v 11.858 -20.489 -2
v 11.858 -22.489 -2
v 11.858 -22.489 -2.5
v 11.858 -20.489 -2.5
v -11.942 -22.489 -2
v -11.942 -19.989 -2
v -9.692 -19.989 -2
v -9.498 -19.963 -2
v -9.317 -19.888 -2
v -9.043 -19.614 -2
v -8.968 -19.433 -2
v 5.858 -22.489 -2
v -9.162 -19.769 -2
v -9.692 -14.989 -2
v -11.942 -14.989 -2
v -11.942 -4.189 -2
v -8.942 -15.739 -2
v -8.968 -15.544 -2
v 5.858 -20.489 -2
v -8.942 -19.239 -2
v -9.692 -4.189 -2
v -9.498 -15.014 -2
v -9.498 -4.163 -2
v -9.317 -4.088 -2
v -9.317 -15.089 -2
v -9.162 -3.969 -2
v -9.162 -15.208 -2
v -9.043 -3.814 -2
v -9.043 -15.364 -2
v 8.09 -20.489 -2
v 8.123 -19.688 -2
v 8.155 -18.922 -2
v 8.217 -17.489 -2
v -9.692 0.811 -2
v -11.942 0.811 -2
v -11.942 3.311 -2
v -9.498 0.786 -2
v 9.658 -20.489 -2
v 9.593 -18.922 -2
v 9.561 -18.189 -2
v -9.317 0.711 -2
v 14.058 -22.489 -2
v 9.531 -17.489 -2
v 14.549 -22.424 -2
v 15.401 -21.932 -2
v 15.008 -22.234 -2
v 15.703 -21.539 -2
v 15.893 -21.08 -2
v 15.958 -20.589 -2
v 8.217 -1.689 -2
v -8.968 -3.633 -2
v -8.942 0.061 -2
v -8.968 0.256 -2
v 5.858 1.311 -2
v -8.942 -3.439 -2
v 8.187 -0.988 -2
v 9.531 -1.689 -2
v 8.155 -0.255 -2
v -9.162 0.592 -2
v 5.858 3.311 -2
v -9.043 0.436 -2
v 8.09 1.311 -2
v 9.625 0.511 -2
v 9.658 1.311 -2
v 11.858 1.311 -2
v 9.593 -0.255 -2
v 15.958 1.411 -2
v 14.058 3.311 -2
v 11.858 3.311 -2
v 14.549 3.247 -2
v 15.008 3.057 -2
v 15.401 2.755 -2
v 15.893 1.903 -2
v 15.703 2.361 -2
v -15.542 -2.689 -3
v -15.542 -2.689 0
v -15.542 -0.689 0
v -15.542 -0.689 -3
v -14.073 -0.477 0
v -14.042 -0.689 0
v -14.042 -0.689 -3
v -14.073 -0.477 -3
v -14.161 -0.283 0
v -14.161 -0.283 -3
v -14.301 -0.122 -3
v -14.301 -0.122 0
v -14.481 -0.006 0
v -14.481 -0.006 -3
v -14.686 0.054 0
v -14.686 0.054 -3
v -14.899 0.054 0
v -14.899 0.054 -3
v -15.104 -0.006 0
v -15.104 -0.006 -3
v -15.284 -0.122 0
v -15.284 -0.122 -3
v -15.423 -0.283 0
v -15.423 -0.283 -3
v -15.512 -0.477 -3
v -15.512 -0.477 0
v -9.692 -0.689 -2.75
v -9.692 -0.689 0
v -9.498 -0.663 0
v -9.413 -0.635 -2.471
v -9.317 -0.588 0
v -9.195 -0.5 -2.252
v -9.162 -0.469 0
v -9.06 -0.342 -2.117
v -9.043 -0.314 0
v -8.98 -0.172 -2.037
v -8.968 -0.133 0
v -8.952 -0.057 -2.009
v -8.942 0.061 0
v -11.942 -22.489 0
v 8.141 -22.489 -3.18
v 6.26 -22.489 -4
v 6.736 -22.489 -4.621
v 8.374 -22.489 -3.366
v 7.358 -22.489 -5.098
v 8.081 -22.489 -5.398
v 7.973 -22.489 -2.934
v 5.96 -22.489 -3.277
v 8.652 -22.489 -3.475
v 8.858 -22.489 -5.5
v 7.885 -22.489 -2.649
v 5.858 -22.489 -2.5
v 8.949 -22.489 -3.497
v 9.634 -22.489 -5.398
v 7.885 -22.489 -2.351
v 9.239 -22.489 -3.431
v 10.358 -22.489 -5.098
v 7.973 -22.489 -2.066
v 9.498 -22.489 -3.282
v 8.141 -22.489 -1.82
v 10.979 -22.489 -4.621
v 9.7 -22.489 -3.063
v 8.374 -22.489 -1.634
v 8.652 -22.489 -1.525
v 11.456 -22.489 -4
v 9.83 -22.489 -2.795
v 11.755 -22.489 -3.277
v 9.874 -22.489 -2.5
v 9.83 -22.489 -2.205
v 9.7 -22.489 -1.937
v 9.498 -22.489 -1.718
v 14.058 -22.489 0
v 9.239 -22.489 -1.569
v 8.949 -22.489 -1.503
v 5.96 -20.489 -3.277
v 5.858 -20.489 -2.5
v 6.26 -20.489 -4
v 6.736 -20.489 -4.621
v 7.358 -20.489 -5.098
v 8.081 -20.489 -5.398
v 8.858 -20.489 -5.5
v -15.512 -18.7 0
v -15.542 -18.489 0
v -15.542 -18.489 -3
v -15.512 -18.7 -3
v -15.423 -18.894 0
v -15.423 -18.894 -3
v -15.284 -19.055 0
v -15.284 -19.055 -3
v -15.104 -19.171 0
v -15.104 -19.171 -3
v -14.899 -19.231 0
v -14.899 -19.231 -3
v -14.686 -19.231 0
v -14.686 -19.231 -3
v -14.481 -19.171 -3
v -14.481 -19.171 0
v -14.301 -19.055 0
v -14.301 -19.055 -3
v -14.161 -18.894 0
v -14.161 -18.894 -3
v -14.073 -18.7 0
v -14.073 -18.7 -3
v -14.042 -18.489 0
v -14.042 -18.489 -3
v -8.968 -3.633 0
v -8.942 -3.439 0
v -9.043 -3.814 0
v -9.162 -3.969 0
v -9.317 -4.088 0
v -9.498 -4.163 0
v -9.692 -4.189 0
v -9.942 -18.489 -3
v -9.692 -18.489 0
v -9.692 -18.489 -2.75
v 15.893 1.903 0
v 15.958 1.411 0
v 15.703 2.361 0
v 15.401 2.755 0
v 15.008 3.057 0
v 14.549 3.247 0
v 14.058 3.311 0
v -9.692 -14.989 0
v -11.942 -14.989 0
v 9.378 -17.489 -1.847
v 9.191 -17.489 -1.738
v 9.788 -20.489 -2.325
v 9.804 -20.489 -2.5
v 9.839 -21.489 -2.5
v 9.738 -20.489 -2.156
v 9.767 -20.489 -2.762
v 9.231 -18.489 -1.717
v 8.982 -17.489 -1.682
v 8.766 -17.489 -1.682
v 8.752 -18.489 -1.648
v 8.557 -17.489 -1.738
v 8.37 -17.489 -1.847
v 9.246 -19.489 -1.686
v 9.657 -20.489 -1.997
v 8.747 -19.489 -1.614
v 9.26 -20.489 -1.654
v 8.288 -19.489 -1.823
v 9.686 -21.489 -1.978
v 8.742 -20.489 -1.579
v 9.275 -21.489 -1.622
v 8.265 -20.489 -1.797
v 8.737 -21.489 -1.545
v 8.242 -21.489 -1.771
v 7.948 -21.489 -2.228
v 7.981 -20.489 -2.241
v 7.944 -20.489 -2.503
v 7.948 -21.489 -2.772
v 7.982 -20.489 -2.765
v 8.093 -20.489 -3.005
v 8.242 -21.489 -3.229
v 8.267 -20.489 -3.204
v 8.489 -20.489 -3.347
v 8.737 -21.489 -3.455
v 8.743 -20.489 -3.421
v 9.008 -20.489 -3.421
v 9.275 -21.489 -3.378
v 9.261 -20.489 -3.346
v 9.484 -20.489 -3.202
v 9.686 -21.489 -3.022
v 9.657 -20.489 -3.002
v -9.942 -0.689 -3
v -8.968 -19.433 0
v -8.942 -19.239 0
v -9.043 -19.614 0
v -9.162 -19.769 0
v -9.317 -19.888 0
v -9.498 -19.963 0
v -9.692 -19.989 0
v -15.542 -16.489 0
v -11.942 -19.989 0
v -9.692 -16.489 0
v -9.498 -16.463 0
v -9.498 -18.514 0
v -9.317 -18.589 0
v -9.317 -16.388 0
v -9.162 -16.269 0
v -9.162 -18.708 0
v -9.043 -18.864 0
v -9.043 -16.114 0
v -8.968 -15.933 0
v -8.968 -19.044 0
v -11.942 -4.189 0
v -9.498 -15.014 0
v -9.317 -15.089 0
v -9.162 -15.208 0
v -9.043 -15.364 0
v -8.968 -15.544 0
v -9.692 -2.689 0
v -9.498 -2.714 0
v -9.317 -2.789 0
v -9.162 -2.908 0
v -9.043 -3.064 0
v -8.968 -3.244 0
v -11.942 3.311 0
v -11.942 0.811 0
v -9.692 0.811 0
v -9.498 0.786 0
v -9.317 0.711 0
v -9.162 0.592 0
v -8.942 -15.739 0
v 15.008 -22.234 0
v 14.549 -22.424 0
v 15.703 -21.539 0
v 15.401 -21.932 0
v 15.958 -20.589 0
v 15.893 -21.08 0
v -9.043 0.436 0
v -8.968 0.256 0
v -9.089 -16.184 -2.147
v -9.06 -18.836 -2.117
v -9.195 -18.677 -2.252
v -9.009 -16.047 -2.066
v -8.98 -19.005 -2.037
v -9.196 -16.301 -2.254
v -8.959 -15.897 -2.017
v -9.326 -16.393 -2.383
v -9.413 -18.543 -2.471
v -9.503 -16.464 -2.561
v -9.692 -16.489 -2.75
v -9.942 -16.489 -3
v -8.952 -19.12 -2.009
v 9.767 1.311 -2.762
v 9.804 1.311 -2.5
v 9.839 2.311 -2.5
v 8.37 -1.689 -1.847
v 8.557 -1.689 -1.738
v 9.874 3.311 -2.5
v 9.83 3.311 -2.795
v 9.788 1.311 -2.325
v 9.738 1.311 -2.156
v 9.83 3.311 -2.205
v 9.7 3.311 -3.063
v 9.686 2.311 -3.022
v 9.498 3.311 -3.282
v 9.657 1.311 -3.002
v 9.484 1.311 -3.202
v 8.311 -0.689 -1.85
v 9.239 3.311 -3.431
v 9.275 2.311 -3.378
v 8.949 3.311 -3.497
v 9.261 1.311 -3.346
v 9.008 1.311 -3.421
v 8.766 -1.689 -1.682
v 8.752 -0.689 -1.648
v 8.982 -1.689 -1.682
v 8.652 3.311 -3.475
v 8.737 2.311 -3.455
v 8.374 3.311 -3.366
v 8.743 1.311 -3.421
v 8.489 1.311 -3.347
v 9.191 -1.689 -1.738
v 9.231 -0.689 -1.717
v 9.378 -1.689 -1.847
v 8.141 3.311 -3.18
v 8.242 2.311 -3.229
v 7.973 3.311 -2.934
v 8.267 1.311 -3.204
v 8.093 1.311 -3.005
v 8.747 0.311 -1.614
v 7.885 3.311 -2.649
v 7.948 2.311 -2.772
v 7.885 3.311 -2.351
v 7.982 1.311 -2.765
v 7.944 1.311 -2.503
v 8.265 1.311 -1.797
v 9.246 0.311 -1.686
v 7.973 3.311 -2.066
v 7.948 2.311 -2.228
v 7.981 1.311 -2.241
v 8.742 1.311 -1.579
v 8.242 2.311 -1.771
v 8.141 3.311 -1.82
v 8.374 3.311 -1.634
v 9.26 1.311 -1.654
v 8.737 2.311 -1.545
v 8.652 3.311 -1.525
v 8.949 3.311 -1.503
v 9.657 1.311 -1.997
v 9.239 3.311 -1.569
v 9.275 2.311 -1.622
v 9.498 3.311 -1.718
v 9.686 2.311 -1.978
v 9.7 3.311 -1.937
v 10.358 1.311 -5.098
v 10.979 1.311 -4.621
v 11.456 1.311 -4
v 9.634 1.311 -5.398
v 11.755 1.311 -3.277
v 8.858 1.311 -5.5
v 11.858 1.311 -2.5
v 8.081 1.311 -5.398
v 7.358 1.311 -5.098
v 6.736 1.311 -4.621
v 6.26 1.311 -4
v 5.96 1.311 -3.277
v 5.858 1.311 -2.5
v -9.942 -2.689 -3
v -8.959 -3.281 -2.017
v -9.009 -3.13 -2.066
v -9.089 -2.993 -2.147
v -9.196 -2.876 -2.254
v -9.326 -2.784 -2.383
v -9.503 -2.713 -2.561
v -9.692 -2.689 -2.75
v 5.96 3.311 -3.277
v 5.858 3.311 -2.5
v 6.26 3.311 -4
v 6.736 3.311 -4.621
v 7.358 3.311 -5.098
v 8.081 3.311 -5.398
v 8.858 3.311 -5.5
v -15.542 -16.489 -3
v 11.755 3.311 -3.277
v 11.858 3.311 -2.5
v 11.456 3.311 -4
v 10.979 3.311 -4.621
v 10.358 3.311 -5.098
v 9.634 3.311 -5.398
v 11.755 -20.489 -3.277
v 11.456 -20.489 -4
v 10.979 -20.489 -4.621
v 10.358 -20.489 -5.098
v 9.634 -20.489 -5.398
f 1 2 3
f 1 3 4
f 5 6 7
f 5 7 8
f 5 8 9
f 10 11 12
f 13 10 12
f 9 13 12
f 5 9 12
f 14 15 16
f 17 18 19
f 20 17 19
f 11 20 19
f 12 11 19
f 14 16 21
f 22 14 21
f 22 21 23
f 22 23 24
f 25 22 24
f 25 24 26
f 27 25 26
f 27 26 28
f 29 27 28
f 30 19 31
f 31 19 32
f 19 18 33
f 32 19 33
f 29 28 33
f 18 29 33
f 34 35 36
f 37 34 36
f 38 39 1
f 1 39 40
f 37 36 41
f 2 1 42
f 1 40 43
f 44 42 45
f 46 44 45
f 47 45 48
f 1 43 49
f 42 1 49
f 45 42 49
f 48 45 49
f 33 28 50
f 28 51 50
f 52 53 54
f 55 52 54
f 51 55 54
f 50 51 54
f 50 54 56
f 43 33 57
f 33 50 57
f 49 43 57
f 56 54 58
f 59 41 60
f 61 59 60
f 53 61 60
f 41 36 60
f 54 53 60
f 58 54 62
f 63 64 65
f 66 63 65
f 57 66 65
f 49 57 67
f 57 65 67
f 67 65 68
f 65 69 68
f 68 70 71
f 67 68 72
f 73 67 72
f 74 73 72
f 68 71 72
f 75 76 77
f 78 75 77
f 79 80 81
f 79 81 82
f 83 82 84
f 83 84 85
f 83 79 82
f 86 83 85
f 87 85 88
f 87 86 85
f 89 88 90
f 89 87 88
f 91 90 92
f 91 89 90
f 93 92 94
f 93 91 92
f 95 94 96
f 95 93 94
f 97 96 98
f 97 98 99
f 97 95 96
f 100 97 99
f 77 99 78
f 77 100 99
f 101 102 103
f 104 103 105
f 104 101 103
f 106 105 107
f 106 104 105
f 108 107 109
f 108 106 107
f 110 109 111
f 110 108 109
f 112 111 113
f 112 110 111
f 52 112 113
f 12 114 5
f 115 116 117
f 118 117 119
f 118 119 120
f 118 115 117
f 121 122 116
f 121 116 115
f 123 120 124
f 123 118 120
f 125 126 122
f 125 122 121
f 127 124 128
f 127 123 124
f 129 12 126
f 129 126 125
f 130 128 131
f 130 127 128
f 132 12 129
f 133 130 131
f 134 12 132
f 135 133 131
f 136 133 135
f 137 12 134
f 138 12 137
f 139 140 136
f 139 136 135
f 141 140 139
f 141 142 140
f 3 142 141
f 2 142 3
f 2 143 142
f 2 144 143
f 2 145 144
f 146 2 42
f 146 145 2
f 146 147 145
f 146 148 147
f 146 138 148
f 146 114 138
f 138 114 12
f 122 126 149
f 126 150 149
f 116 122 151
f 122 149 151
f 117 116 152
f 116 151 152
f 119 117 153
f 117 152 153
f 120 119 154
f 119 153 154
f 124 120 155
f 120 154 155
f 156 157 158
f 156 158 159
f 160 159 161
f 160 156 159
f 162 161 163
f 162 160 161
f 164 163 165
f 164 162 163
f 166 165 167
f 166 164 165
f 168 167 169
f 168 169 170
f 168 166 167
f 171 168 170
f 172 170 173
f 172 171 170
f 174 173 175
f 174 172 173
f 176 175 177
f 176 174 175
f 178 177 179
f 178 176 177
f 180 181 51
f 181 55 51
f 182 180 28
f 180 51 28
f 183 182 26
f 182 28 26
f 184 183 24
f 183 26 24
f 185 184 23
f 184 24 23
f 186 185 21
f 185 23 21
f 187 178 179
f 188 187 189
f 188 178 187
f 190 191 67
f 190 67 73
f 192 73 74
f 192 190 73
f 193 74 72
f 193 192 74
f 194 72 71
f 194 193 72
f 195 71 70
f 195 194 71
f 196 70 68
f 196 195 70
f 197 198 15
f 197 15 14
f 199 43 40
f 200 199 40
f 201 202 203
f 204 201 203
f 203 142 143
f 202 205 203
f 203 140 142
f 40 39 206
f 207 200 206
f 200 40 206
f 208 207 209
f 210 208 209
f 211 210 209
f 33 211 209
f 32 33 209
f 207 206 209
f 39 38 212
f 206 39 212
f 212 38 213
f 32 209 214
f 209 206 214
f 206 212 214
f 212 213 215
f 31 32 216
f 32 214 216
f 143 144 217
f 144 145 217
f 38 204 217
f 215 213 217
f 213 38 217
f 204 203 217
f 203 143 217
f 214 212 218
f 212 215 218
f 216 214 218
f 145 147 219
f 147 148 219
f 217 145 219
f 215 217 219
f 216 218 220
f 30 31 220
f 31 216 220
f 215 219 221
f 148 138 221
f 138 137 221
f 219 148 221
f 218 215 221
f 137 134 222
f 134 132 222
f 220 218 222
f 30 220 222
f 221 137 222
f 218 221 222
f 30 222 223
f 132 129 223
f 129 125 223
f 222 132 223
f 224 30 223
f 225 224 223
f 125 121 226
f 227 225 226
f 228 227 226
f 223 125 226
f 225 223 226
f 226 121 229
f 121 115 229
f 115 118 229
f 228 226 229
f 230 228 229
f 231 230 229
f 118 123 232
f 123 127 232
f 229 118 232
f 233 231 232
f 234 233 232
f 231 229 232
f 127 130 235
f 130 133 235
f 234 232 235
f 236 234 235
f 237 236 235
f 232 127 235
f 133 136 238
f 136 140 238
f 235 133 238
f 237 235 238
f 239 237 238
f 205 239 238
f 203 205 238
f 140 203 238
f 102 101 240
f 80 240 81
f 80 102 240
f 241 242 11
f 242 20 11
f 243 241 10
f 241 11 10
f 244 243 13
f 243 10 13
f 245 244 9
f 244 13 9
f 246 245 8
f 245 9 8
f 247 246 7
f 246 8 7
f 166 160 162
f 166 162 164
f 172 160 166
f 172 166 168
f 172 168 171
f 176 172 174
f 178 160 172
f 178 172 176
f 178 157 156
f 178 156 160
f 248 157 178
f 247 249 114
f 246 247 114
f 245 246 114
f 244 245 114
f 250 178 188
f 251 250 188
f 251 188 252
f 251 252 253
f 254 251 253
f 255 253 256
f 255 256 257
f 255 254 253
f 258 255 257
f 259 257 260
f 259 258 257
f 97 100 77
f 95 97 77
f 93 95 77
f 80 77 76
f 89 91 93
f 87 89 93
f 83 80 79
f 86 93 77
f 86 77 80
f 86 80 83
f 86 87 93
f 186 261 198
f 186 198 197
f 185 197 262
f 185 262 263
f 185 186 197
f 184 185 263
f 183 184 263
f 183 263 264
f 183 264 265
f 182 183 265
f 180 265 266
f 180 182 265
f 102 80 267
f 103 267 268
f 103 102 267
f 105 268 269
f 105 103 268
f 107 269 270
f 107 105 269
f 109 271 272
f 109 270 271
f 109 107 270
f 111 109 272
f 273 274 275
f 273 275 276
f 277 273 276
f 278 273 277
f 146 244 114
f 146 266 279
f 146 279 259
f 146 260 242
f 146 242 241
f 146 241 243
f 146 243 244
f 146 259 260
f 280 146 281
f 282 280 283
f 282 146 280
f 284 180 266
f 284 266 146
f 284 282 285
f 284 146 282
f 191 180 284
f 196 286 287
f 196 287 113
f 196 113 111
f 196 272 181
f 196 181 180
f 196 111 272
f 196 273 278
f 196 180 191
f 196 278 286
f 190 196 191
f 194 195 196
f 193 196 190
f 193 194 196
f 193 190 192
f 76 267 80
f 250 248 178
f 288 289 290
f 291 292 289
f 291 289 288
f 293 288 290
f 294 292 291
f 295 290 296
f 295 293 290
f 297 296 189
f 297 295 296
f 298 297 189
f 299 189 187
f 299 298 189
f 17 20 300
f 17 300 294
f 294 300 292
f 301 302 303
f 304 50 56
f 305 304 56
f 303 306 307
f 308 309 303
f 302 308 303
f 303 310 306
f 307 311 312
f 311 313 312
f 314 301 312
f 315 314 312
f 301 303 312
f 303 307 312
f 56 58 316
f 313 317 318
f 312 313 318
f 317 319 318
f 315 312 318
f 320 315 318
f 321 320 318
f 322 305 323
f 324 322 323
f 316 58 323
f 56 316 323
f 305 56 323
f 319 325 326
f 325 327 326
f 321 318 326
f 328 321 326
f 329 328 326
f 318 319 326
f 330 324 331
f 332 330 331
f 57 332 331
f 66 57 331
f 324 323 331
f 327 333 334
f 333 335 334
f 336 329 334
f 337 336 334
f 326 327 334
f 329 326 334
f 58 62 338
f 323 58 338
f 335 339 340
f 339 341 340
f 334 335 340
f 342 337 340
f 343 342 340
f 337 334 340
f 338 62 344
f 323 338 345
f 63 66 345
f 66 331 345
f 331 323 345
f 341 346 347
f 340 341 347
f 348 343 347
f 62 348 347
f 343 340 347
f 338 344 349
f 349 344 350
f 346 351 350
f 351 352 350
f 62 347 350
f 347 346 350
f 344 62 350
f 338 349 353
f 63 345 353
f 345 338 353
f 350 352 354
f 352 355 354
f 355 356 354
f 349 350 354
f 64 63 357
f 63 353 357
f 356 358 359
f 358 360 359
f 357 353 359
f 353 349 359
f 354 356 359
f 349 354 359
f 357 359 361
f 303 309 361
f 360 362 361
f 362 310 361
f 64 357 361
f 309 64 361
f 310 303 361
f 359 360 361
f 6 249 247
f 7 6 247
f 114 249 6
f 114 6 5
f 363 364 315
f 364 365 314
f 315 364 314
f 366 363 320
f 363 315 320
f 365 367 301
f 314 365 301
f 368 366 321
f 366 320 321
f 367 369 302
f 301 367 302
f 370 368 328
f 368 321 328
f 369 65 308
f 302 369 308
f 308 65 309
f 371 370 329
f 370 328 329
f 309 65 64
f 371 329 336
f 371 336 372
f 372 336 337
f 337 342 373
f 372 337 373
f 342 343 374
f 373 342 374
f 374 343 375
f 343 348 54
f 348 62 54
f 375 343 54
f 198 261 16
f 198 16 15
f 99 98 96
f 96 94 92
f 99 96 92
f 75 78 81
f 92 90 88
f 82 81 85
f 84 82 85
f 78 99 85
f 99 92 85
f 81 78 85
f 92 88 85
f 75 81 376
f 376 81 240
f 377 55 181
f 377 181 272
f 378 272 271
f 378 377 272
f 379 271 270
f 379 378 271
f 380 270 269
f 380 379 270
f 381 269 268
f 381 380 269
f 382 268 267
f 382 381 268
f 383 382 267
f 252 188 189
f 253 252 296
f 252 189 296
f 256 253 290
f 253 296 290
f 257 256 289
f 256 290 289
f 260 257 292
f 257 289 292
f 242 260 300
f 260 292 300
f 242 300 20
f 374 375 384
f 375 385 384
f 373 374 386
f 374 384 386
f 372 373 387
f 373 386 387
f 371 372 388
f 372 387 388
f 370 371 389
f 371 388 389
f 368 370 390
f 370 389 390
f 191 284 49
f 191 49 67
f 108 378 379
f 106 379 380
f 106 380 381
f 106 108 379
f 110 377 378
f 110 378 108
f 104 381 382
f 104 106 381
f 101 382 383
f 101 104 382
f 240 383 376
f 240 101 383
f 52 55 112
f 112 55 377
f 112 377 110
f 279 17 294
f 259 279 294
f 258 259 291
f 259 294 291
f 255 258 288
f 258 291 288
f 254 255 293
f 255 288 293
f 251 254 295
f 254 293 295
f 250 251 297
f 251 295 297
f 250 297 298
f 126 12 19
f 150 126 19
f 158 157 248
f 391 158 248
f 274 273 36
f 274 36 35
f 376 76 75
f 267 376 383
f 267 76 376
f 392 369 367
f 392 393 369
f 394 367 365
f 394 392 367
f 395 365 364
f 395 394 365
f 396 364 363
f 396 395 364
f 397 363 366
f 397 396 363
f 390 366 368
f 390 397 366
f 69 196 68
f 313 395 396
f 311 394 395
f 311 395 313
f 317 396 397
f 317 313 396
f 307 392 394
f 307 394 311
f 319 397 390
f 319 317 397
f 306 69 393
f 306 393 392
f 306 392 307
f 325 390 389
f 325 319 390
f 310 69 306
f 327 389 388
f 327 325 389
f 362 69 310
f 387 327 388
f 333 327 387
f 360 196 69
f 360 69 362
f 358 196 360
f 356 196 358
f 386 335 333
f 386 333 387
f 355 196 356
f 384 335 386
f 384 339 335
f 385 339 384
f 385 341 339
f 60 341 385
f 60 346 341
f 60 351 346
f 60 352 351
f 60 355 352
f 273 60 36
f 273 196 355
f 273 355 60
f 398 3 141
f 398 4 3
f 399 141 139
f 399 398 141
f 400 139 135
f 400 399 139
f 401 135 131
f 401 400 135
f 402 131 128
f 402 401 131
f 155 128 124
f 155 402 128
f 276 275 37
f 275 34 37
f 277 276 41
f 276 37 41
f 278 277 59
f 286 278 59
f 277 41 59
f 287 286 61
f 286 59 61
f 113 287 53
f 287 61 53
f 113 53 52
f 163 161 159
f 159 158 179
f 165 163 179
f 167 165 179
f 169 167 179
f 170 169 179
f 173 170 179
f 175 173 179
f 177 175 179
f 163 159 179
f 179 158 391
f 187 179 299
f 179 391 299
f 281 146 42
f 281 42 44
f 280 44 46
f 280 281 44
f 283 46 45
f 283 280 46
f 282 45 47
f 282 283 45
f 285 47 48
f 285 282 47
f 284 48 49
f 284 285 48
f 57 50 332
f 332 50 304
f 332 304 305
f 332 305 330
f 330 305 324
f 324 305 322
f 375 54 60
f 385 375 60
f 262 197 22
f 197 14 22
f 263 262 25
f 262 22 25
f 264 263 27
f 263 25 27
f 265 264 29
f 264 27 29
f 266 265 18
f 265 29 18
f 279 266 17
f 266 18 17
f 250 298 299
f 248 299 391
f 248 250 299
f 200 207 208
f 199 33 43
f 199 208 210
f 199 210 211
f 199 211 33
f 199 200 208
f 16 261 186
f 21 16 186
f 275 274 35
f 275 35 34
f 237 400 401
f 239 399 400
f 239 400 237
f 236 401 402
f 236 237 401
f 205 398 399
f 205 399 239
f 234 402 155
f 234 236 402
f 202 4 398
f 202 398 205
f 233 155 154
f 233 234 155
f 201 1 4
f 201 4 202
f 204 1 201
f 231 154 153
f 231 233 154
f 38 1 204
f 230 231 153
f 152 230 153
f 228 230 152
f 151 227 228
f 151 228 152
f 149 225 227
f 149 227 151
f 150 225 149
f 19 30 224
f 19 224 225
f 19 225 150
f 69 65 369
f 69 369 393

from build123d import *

# Parameters (mm, degrees)
EXTRUDE_1_DEPTH     = 2
SKETCH_2_W          = 6
SKETCH_2_H          = 2
EXTRUDE_2_DEPTH     = 3.5
FILLET_1_R          = 3
SKETCH_3_R          = 1
CUT_EXTRUDE_1_DEPTH = 5
CUT_EXTRUDE_1_DRAFT = -2
SKETCH_4_R          = 1
CUT_EXTRUDE_2_DEPTH = 5
CUT_EXTRUDE_2_DRAFT = -2
SKETCH_6_W          = 3.6
SKETCH_6_H          = 2
EXTRUDE_3_DEPTH     = 3
CHAMFER_1_SIZE      = 3
SKETCH_7_R          = 0.75
EXTRUDE_4_DEPTH     = 3
CUT_EXTRUDE_3_REACH = 30.118
SKETCH_8_W          = 3
SKETCH_8_H          = 1.5
FILLET_2_R          = 0.75


# Some blends are built 0.0001 mm under size
with BuildPart() as part:
    # 草图1 → 凸台-拉伸1 (new body)
    with BuildSketch(Plane.XY):
        with BuildLine():
            Line((-11.942385676, 3.311338927), (-11.942385676, -22.488661073))
            Line((-11.942385676, -22.488661073), (14.057614324, -22.488661073))
            ThreePointArc((14.057614324, -22.488661073), (15.401117208, -21.932163957), (15.957614324, -20.588661073))
            Line((15.957614324, -20.588661073), (15.957614324, 1.411338927))
            ThreePointArc((15.957614324, 1.411338927), (15.401117208, 2.754841811), (14.057614324, 3.311338927))
            Line((14.057614324, 3.311338927), (-11.942385676, 3.311338927))
        make_face()
    extrude(amount=-EXTRUDE_1_DEPTH)

    # 草图2 → 凸台-拉伸2 (add)
    with BuildSketch(Plane(origin=(0, 0, -2), x_dir=(-1, 0, 0), z_dir=(0, 0, -1))):
        with Locations((-8.857614324, -21.488661073)):
            Rectangle(SKETCH_2_W, SKETCH_2_H)
        with Locations((-8.857614324, 2.311338927)):
            Rectangle(SKETCH_2_W, SKETCH_2_H)
    extrude(amount=EXTRUDE_2_DEPTH)

    # 圆角1
    fillet_1_edges = [part.edges().sort_by_distance(p)[0] for p in [
        (11.857614324, 2.311338927, -5.5),
        (5.857614324, 2.311338927, -5.5),
        (11.857614324, -21.488661073, -5.5),
        (5.857614324, -21.488661073, -5.5),
    ]]
    fillet(fillet_1_edges, radius=FILLET_1_R - 0.0001)  # a hair under: the kernel refuses the full size


with BuildPart() as cut_extrude_1_tool:
    # 草图3 → 切除-拉伸1 (with draft: the straight prism first)
    with BuildSketch(Plane.XZ.offset(22.488661073)):
        with Locations((8.874069652, -2.5)):
            Circle(SKETCH_3_R)
    extrude(amount=-CUT_EXTRUDE_1_DEPTH)
    # 切除-拉伸1: the draft: its side faces are tilted about the plane it starts from
    cut_extrude_1_sides = [cut_extrude_1_tool.faces().sort_by_distance(p)[0] for p in [
        (7.874069652, -19.988661073, -2.5),
    ]]
    draft(cut_extrude_1_sides, Plane.XZ.offset(22.488661073), CUT_EXTRUDE_1_DRAFT)


with BuildPart() as part_1:
    add(part.part)

    # 切除-拉伸1: cut by cut_extrude_1_tool
    add(cut_extrude_1_tool.part, mode=Mode.SUBTRACT)


with BuildPart() as cut_extrude_2_tool:
    # 草图4 → 切除-拉伸2 (with draft: the straight prism first)
    with BuildSketch(Plane(origin=(0, 3.311338927, 0), x_dir=(1, 0, 0), z_dir=(0, 1, 0))):
        with Locations((8.874069652, 2.5)):
            Circle(SKETCH_4_R)
    extrude(amount=-CUT_EXTRUDE_2_DEPTH)
    # 切除-拉伸2: the draft: its side faces are tilted about the plane it starts from
    cut_extrude_2_sides = [cut_extrude_2_tool.faces().sort_by_distance(p)[0] for p in [
        (7.874069652, 0.811338927, -2.5),
    ]]
    draft(cut_extrude_2_sides, Plane(origin=(0, 3.311338927, 0), x_dir=(1, 0, 0), z_dir=(0, 1, 0)), CUT_EXTRUDE_2_DRAFT)


with BuildPart() as part_2:
    add(part_1.part)

    # 切除-拉伸2: cut by cut_extrude_2_tool
    add(cut_extrude_2_tool.part, mode=Mode.SUBTRACT)

    # 草图6 → 凸台-拉伸3 (add)
    with BuildSketch(Plane.XY):
        with Locations((-13.742385676, -1.688661073)):
            Rectangle(SKETCH_6_W, SKETCH_6_H)
        with Locations((-13.742385676, -17.488661073)):
            Rectangle(SKETCH_6_W, SKETCH_6_H)
    extrude(amount=-EXTRUDE_3_DEPTH)

    # 倒角1
    # the kernel refuses this chamfer: 3 mm, written as the material it adds along each edge
    with BuildSketch(Plane(origin=(-11.942385676, -16.488661073, -2), x_dir=(0.9996219169112969, 0, 0.027495876610586355), z_dir=(0, -1, 0))) as chamfer_1_piece_1_section:
        Polygon((CHAMFER_1_SIZE * 0.999621916911, -CHAMFER_1_SIZE * 0.0274958766106), (-CHAMFER_1_SIZE * 0.0274958766106, -CHAMFER_1_SIZE * 0.999621916911), (0, 0), align=None)
    chamfer_1_piece_1 = extrude(amount=2, mode=Mode.PRIVATE)
    chamfer_1_piece_1 = split(chamfer_1_piece_1, bisect_by=Plane(origin=(-10.675719009, -17.488661073, -3), z_dir=(0, 0, 1)), keep=Keep.TOP, mode=Mode.PRIVATE)
    add(chamfer_1_piece_1)
    with BuildSketch(Plane(origin=(-11.942385676, -0.688661073, -2), x_dir=(0.9996219169112969, 0, 0.027495876610586355), z_dir=(0, -1, 0))) as chamfer_1_piece_2_section:
        Polygon((CHAMFER_1_SIZE * 0.999621916911, -CHAMFER_1_SIZE * 0.0274958766106), (-CHAMFER_1_SIZE * 0.0274958766106, -CHAMFER_1_SIZE * 0.999621916911), (0, 0), align=None)
    chamfer_1_piece_2 = extrude(amount=2, mode=Mode.PRIVATE)
    chamfer_1_piece_2 = split(chamfer_1_piece_2, bisect_by=Plane(origin=(-10.675719009, -1.688661073, -3), z_dir=(0, 0, 1)), keep=Keep.TOP, mode=Mode.PRIVATE)
    add(chamfer_1_piece_2)

    # 草图7 → 凸台-拉伸4 (add)
    with BuildSketch(Plane.XY):
        with Locations((-14.792385676, -0.688661073)):
            Circle(SKETCH_7_R)
        with Locations((-14.792385676, -18.488661073)):
            Circle(SKETCH_7_R)
    extrude(amount=-EXTRUDE_4_DEPTH)

    # 草图8 → 切除-拉伸3 (cut, up to next)
    with BuildSketch(Plane.XY, mode=Mode.PRIVATE) as cut_extrude_3_sk1:
        with Locations((-10.442385676, -3.438661073)):
            Rectangle(SKETCH_8_W, SKETCH_8_H)
    cut_extrude_3_tool1 = extrude(cut_extrude_3_sk1.sketch, amount=-CUT_EXTRUDE_3_REACH, mode=Mode.PRIVATE) & part_2.part
    # 草图8 → 切除-拉伸3 (cut, up to next)
    with BuildSketch(Plane.XY, mode=Mode.PRIVATE) as cut_extrude_3_sk2:
        with Locations((-10.442385676, 0.061338927)):
            Rectangle(SKETCH_8_W, SKETCH_8_H)
    cut_extrude_3_tool2 = extrude(cut_extrude_3_sk2.sketch, amount=-CUT_EXTRUDE_3_REACH, mode=Mode.PRIVATE) & part_2.part
    # 草图8 → 切除-拉伸3 (cut, up to next)
    with BuildSketch(Plane.XY, mode=Mode.PRIVATE) as cut_extrude_3_sk3:
        with Locations((-10.442385676, -15.738661073)):
            Rectangle(SKETCH_8_W, SKETCH_8_H)
    cut_extrude_3_tool3 = extrude(cut_extrude_3_sk3.sketch, amount=-CUT_EXTRUDE_3_REACH, mode=Mode.PRIVATE) & part_2.part
    # 草图8 → 切除-拉伸3 (cut, up to next)
    with BuildSketch(Plane.XY, mode=Mode.PRIVATE) as cut_extrude_3_sk4:
        with Locations((-10.442385676, -19.238661073)):
            Rectangle(SKETCH_8_W, SKETCH_8_H)
    cut_extrude_3_tool4 = extrude(cut_extrude_3_sk4.sketch, amount=-CUT_EXTRUDE_3_REACH, mode=Mode.PRIVATE) & part_2.part
    add(cut_extrude_3_tool1.solids().sort_by_distance((-10.442386, -3.438661, 0))[0], mode=Mode.SUBTRACT)
    add(cut_extrude_3_tool2.solids().sort_by_distance((-10.442386, 0.061339, 0))[0], mode=Mode.SUBTRACT)
    add(cut_extrude_3_tool3.solids().sort_by_distance((-10.442386, -15.738661, 0))[0], mode=Mode.SUBTRACT)
    add(cut_extrude_3_tool4.solids().sort_by_distance((-10.442386, -19.238661, 0))[0], mode=Mode.SUBTRACT)

    # 圆角2
    fillet_2_edges = [part_2.edges().sort_by_distance(p)[0] for p in [
        (-8.942385676, -2.688661073, -1),
        (-8.942385676, 0.811338927, -1),
        (-8.942385676, -18.488661073, -1),
        (-8.942385676, -14.988661073, -1),
        (-8.942385676, -19.988661073, -1),
        (-8.942385676, -16.488661073, -1),
        (-8.942385676, -4.188661073, -1),
        (-8.942385676, -0.688661073, -1),
    ]]
    fillet(fillet_2_edges, radius=FILLET_2_R - 0.0001)  # a hair under: the kernel refuses the full size


solid = part_2.part
